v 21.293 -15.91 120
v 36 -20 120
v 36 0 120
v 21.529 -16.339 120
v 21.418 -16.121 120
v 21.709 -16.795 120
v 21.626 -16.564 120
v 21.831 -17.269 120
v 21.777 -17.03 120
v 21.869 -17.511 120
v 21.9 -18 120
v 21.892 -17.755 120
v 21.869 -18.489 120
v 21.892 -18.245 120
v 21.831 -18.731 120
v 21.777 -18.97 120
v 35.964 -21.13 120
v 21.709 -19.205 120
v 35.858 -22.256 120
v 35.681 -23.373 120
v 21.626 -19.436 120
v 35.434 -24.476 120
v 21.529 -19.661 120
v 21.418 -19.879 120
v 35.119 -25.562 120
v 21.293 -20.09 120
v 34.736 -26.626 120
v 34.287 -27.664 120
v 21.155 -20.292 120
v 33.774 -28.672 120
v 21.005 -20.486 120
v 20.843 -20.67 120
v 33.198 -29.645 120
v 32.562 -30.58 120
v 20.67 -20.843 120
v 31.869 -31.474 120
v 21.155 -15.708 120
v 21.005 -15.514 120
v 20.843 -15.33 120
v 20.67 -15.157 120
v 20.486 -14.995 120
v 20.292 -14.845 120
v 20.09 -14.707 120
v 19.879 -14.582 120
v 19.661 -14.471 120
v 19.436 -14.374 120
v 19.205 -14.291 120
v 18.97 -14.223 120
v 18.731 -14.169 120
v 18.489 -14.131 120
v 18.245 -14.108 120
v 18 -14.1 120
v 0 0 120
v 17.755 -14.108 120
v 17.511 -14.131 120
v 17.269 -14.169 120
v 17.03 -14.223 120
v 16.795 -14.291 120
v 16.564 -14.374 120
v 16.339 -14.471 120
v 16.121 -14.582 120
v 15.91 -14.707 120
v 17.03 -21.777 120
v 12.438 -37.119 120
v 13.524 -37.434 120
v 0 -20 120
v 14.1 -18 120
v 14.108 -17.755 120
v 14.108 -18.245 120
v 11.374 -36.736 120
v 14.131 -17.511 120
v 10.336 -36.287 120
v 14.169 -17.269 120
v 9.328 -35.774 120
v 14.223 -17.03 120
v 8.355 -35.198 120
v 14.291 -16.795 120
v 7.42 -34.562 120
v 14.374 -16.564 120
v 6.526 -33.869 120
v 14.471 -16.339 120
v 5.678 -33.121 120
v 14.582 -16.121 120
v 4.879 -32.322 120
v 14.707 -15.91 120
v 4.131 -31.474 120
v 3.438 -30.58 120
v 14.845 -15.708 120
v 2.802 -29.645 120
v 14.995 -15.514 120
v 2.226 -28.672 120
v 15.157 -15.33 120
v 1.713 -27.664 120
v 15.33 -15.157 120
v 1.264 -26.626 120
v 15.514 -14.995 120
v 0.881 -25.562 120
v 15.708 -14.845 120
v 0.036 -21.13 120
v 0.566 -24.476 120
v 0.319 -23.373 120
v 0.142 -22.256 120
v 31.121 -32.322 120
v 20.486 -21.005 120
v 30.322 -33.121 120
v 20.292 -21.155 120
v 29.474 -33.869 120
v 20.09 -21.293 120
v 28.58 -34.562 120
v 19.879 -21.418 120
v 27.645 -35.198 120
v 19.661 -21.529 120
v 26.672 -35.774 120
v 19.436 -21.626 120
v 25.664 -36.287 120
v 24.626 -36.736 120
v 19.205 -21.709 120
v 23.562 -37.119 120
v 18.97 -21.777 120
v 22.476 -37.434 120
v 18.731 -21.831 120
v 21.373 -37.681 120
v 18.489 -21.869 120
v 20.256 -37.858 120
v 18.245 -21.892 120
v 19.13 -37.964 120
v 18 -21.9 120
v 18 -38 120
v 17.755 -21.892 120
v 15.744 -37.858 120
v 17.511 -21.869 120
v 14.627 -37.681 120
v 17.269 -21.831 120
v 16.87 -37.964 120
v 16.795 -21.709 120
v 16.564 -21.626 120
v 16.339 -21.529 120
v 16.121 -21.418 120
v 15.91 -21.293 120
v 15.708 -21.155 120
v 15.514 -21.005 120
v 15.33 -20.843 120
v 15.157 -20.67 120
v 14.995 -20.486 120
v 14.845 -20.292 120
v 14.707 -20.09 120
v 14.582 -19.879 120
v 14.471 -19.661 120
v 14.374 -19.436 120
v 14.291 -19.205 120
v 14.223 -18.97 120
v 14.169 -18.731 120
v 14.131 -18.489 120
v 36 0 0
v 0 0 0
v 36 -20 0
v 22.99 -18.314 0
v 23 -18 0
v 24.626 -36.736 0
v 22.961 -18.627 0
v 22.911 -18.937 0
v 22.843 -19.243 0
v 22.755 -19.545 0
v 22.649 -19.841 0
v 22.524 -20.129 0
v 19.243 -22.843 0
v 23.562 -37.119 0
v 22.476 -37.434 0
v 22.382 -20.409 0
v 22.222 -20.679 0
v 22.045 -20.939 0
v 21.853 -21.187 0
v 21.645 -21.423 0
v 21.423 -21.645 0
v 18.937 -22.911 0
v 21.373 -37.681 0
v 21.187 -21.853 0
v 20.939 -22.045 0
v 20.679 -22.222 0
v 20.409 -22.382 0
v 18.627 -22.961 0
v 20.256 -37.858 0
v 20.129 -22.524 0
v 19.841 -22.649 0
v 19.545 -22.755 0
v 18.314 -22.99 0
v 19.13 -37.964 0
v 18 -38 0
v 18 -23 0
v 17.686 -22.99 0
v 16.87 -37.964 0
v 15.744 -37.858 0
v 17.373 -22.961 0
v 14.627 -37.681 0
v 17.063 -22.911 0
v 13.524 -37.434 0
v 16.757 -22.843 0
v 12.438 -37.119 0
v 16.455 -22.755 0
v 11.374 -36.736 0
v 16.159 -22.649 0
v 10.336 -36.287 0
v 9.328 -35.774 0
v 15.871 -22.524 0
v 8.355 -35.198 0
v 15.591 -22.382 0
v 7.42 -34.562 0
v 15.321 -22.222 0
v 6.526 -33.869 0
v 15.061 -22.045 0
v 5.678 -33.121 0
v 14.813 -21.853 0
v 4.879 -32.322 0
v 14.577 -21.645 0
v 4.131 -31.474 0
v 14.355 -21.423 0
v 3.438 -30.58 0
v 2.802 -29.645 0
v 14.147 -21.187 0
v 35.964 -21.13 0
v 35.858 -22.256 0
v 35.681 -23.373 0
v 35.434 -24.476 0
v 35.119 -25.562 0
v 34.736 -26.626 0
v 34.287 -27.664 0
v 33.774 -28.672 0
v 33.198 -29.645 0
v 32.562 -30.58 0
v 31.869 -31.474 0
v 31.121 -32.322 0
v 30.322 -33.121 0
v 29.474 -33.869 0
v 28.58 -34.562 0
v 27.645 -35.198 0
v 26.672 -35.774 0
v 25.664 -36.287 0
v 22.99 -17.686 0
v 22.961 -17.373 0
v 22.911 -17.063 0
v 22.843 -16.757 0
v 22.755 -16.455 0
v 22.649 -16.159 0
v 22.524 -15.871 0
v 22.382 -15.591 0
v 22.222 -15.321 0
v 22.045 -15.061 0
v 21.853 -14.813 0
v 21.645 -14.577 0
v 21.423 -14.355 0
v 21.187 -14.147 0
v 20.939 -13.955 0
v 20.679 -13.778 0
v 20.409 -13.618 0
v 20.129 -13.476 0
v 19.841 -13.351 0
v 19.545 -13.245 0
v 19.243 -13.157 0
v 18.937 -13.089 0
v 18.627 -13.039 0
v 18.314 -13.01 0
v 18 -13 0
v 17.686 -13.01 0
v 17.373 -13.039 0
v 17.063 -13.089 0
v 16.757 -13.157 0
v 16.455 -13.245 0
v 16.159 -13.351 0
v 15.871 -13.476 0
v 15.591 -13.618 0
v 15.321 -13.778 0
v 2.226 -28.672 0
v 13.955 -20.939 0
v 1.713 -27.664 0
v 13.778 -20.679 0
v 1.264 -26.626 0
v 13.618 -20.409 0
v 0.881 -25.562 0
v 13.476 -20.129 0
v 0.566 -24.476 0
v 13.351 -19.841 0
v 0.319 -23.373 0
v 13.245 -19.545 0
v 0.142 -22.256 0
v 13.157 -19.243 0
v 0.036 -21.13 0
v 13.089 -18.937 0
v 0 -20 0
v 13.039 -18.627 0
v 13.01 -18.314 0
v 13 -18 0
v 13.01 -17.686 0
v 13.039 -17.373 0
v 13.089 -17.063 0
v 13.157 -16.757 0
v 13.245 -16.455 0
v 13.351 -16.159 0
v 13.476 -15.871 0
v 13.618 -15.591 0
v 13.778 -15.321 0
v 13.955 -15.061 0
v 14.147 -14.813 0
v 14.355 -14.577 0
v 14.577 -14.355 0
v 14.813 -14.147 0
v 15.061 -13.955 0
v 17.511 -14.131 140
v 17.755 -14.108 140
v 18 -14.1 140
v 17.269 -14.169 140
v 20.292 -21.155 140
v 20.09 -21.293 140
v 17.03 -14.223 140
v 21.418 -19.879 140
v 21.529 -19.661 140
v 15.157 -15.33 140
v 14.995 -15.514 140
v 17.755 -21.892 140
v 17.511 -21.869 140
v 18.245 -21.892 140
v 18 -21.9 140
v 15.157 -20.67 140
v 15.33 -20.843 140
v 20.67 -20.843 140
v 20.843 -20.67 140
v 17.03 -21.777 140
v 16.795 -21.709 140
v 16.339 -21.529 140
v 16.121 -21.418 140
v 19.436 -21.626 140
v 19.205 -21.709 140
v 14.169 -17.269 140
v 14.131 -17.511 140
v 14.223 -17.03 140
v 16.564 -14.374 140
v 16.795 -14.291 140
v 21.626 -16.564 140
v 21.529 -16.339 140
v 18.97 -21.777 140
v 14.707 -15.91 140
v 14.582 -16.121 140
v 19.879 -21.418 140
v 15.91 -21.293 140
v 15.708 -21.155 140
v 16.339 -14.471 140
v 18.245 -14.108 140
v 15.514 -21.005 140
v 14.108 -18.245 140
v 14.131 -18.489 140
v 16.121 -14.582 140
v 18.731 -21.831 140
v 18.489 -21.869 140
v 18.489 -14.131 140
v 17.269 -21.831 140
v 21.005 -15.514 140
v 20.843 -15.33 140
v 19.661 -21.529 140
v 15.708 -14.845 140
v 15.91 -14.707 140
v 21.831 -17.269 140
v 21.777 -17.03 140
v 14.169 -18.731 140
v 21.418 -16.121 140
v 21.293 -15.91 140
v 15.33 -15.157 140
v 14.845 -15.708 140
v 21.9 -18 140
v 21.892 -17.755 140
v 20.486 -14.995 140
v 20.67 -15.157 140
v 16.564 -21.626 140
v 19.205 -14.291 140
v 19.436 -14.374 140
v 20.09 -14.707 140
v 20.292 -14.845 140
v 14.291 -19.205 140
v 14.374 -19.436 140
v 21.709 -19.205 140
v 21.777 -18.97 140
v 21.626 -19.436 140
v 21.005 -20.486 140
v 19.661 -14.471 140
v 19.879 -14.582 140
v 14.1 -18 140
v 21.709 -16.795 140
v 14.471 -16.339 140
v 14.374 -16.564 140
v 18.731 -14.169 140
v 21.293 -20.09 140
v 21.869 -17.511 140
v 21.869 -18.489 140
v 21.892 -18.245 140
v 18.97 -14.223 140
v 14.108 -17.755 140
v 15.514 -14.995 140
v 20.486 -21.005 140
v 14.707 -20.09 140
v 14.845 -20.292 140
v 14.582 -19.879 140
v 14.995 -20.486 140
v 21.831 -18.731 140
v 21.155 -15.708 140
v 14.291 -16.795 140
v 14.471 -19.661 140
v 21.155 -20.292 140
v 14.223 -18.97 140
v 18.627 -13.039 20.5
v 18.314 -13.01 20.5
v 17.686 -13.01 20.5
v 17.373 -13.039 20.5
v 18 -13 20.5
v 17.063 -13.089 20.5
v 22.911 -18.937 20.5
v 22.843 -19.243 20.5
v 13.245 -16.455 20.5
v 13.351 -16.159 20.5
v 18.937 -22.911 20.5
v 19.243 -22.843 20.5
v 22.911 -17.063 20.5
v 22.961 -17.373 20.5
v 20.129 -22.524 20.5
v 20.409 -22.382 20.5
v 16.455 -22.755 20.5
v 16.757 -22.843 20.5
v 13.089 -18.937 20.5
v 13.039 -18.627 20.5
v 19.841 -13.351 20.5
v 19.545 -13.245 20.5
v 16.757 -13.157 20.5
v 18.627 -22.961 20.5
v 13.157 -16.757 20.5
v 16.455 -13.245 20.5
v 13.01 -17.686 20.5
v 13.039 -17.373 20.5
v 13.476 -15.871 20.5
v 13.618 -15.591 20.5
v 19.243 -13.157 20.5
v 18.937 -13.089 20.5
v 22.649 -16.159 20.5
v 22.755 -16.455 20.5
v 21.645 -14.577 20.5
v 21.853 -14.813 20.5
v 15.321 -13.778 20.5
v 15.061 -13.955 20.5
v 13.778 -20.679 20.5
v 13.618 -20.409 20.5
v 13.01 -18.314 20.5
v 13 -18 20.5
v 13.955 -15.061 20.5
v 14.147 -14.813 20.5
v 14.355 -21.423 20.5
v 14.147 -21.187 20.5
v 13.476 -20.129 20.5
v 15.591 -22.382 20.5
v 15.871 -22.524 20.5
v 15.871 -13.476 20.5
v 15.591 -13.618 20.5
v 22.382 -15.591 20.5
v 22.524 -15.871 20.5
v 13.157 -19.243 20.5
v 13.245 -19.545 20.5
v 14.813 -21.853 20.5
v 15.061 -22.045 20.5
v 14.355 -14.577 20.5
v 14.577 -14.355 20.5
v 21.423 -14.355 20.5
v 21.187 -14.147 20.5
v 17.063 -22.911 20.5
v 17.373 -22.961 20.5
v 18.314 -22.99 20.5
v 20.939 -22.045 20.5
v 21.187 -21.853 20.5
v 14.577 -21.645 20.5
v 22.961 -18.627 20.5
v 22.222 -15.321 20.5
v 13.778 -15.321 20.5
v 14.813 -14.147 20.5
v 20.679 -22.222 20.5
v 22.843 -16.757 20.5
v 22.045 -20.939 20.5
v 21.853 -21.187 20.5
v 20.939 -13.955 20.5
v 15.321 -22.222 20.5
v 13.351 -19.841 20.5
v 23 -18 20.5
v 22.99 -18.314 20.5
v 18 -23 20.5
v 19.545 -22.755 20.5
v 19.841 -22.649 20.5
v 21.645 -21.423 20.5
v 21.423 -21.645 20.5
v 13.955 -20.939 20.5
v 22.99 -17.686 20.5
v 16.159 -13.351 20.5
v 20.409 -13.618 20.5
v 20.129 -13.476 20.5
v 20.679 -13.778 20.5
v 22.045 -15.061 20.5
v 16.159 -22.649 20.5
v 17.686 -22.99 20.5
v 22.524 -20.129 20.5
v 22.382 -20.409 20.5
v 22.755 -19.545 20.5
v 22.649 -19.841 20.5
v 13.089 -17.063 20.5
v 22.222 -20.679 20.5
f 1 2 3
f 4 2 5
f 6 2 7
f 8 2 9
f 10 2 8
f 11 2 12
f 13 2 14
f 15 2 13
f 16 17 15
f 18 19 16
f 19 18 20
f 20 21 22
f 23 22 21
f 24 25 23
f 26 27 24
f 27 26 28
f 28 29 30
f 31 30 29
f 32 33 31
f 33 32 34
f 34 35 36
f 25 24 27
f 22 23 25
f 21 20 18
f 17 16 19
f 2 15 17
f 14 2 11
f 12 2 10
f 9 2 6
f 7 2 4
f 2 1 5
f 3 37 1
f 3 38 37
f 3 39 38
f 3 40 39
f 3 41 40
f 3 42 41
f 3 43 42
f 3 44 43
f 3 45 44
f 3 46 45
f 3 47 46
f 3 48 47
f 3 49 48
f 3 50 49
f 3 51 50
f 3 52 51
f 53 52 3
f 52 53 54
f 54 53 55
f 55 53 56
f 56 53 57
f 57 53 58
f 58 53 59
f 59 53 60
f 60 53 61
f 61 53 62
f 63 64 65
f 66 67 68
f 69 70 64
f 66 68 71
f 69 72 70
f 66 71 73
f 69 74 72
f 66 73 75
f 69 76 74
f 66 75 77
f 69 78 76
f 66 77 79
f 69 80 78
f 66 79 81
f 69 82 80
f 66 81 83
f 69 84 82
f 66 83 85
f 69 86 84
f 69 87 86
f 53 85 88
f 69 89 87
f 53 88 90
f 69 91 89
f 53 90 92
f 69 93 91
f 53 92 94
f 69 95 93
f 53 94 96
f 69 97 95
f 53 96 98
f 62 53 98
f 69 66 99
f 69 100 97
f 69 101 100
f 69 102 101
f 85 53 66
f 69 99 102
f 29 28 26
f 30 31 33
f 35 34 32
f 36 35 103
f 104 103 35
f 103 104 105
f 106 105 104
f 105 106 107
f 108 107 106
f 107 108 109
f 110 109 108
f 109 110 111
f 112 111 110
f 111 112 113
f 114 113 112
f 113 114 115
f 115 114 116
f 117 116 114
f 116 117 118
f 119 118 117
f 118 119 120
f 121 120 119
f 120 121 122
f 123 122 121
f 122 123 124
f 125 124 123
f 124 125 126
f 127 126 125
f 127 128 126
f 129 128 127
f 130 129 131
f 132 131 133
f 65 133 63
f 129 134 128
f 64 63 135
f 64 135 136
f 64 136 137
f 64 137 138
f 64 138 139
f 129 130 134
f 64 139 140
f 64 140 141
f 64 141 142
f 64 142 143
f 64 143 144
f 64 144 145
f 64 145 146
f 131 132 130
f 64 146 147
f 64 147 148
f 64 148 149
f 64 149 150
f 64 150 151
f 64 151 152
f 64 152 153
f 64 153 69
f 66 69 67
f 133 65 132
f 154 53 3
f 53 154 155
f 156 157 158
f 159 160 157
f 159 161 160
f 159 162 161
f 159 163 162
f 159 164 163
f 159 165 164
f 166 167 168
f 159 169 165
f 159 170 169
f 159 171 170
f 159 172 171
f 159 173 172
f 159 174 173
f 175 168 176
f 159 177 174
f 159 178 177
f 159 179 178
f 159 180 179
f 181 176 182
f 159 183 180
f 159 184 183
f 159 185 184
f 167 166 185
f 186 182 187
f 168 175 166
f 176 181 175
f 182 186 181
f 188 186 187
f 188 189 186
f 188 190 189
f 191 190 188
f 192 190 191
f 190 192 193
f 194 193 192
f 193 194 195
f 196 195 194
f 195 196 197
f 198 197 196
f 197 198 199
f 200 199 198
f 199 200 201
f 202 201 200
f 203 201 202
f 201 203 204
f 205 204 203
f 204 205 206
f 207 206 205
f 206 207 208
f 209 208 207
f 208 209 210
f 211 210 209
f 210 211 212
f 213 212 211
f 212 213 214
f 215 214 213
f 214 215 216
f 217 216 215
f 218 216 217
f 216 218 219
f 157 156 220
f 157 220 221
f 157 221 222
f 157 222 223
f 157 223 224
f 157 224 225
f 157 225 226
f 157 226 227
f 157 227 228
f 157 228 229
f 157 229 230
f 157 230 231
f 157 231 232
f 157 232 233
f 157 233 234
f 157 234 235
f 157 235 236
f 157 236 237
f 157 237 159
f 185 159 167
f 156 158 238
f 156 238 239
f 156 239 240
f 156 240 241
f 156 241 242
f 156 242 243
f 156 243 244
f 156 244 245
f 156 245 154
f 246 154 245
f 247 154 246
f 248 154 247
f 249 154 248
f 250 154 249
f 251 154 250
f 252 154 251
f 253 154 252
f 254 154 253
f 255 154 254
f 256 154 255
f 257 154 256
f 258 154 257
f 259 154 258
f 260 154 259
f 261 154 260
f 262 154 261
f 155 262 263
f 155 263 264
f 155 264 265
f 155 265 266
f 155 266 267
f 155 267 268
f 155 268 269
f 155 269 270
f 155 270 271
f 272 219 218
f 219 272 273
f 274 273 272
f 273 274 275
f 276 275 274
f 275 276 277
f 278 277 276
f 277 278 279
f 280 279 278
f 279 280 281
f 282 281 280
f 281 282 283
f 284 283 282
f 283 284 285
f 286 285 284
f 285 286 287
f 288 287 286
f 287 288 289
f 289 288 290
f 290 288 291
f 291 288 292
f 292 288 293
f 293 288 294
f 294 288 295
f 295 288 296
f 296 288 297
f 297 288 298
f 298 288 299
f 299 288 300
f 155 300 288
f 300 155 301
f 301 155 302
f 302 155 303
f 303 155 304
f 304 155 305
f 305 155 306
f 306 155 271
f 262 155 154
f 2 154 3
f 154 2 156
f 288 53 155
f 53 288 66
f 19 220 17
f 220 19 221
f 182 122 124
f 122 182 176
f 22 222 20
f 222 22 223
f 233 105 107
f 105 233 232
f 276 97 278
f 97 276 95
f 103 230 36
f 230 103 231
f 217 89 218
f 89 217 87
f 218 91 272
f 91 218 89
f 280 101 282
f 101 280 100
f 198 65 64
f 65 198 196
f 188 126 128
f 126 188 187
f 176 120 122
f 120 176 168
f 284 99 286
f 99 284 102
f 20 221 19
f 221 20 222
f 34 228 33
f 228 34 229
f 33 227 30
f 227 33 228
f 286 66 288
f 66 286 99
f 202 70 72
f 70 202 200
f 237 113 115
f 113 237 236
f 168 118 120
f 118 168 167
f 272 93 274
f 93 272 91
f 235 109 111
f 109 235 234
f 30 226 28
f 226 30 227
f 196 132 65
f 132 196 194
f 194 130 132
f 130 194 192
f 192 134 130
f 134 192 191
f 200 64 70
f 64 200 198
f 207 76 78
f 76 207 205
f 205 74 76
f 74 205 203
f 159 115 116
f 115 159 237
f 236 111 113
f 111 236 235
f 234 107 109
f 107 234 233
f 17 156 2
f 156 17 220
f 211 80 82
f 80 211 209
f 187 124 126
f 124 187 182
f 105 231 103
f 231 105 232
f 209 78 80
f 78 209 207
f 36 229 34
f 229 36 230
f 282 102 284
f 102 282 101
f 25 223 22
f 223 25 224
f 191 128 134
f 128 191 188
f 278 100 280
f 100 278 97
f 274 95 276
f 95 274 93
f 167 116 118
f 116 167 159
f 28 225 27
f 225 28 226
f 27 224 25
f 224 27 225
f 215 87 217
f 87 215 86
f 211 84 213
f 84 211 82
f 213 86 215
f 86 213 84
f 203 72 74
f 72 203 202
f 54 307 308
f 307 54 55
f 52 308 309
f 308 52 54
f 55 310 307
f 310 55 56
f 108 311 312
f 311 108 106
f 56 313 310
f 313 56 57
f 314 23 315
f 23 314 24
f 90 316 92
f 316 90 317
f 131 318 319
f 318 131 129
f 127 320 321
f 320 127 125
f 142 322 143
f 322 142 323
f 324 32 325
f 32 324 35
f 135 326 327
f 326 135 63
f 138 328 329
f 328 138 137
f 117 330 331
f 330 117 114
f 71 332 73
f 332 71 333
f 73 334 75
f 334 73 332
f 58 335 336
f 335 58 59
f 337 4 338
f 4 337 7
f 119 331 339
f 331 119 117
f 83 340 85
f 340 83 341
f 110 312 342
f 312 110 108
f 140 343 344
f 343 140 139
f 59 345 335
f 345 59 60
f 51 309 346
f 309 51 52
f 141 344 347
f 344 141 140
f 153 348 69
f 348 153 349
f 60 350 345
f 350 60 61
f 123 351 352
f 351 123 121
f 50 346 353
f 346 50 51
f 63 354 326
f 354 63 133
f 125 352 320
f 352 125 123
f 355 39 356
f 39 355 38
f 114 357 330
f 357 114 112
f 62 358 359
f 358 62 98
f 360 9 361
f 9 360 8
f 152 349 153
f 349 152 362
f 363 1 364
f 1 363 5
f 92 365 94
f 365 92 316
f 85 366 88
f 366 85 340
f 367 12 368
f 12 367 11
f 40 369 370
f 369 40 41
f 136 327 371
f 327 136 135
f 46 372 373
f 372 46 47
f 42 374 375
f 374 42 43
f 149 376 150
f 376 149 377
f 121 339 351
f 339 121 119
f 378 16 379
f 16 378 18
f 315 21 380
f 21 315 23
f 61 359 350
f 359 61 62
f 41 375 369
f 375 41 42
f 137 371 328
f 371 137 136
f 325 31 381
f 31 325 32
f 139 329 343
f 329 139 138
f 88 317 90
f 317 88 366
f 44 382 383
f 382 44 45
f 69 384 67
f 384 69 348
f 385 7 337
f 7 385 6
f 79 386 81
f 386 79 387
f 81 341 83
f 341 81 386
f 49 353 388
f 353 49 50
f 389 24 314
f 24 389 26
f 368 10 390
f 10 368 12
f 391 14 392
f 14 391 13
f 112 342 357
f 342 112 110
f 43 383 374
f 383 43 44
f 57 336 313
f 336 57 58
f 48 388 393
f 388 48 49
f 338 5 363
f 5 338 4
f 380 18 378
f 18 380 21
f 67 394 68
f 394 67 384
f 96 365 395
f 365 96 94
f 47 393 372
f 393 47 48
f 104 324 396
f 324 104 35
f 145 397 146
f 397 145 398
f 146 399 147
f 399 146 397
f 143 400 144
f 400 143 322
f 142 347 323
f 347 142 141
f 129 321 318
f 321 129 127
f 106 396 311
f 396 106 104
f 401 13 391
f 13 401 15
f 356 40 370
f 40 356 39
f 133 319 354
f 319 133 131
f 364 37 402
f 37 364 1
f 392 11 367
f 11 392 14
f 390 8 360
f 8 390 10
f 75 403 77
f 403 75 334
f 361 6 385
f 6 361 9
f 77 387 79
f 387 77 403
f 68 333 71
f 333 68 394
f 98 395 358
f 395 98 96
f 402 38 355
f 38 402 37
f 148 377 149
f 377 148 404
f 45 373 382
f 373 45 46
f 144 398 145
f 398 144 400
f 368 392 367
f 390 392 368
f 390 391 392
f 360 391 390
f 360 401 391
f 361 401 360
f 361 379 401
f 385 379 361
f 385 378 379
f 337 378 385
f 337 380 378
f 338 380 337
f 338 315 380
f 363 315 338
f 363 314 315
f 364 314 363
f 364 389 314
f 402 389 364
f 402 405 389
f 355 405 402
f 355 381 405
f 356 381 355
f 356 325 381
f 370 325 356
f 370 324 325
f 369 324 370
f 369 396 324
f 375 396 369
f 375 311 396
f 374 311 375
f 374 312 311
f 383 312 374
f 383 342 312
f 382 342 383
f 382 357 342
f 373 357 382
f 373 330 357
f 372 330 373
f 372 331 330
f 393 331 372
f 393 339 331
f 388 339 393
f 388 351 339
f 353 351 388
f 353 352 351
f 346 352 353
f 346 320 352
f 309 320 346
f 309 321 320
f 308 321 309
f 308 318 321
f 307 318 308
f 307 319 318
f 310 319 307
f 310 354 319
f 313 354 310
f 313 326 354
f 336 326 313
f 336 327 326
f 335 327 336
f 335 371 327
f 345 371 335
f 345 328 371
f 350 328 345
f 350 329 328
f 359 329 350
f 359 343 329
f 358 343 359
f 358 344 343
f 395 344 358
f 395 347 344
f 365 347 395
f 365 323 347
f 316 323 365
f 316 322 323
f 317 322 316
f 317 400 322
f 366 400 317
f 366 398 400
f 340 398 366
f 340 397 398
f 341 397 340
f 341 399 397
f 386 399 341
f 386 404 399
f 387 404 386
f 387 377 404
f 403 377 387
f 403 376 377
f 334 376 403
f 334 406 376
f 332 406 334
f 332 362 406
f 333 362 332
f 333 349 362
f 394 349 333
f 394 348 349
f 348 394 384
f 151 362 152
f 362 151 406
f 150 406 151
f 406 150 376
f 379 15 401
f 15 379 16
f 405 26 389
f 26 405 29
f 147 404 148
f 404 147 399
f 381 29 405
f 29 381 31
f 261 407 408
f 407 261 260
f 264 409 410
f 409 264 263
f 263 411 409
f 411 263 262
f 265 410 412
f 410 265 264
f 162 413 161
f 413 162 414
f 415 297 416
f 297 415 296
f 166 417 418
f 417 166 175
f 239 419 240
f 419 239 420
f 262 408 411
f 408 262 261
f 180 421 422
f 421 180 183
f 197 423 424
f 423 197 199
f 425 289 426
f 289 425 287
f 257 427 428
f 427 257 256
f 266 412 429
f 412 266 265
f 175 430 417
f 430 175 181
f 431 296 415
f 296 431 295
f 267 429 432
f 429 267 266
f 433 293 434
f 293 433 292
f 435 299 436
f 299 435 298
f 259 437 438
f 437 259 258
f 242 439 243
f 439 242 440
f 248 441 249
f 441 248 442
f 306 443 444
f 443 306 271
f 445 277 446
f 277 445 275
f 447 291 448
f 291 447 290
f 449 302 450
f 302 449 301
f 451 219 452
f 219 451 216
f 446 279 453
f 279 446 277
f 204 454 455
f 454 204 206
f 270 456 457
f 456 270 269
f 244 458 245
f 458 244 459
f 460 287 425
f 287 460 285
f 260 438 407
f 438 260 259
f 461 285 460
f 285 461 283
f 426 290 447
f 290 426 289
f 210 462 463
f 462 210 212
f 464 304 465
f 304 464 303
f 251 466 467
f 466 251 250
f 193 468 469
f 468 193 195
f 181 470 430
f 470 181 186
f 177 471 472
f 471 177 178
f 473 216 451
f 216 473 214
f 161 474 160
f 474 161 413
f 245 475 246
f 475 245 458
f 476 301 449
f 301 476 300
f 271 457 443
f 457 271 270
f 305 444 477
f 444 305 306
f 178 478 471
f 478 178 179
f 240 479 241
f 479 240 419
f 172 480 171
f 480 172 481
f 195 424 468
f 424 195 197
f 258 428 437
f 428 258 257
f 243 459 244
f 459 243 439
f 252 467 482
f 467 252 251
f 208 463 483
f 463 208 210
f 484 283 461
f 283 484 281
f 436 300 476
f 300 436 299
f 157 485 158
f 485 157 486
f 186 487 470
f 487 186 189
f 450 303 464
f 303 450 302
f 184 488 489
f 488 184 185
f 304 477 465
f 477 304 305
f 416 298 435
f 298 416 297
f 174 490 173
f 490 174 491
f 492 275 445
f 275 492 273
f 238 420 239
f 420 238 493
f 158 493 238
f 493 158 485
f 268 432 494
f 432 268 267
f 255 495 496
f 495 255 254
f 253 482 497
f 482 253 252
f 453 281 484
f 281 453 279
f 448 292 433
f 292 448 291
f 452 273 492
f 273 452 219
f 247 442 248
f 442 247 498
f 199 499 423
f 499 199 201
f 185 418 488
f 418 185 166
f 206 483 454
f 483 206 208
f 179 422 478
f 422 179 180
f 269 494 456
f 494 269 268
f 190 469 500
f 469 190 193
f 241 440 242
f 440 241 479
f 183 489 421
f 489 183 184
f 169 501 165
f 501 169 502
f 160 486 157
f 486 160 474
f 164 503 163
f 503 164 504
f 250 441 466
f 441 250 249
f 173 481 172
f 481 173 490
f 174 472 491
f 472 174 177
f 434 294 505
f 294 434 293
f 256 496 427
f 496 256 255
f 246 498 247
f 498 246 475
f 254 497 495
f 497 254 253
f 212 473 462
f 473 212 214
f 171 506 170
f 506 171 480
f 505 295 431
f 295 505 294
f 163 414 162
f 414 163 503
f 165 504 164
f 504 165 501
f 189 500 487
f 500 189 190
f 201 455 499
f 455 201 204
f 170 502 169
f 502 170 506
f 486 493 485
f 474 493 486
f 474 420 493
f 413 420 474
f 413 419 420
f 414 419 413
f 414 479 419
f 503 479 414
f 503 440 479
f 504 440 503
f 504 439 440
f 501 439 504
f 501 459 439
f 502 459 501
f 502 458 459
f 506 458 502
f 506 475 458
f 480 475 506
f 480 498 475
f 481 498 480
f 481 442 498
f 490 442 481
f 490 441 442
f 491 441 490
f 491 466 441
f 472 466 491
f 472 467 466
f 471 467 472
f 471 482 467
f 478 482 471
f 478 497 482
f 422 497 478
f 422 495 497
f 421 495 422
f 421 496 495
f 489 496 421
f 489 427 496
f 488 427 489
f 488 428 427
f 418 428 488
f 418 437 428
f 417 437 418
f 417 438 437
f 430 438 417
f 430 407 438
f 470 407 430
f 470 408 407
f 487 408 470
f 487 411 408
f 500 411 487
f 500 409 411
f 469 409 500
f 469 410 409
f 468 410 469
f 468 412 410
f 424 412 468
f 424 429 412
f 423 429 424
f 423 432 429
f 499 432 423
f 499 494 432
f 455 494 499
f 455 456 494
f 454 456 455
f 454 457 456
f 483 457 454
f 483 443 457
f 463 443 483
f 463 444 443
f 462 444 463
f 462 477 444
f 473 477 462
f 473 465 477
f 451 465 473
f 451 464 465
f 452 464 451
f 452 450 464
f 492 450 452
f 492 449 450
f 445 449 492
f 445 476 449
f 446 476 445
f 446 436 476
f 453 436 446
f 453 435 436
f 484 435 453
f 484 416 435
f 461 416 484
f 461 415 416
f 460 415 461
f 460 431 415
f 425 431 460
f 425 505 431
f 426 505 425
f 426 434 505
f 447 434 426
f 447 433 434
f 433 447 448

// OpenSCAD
$fn=100;

module razor_handle(r=20)
{
	cy_r=r;
	cy_h=r*3;

	cu_x=cy_h;
	cu_y=2*cy_r;
	cu_z=cy_r;

	translate([0,0,0]){
		rotate([90,0,0]) {
			difference() {
				union() {
		
					//body
					translate([0,0,cy_r]) {
						rotate([180,0,90]) {
							cube([2*cu_x,cu_y-4,cu_z]);
							translate([0,cy_r-2,0]) {
								rotate([0,90,0]) {
									cylinder(r=cy_r-2,h=2*cy_h);
								}
							}
						}
					}//end body
			
					//male connector
					translate([cy_r-2,2*cy_h,18]) {
						rotate([0,90,90]) {
							cylinder(r=cy_r/5-.1,h=cy_h/3);
						}
					}//end male connector
				

				}//union

				//female connector
				translate([cy_r-2,cy_r-20.5,18]) {
					rotate([0,90,90]) {
						cylinder(r=cy_r/5+1,h=cy_h/3+1);
					}
				}//end female connector

			}//difference
		}
	}
}

razor_handle();
